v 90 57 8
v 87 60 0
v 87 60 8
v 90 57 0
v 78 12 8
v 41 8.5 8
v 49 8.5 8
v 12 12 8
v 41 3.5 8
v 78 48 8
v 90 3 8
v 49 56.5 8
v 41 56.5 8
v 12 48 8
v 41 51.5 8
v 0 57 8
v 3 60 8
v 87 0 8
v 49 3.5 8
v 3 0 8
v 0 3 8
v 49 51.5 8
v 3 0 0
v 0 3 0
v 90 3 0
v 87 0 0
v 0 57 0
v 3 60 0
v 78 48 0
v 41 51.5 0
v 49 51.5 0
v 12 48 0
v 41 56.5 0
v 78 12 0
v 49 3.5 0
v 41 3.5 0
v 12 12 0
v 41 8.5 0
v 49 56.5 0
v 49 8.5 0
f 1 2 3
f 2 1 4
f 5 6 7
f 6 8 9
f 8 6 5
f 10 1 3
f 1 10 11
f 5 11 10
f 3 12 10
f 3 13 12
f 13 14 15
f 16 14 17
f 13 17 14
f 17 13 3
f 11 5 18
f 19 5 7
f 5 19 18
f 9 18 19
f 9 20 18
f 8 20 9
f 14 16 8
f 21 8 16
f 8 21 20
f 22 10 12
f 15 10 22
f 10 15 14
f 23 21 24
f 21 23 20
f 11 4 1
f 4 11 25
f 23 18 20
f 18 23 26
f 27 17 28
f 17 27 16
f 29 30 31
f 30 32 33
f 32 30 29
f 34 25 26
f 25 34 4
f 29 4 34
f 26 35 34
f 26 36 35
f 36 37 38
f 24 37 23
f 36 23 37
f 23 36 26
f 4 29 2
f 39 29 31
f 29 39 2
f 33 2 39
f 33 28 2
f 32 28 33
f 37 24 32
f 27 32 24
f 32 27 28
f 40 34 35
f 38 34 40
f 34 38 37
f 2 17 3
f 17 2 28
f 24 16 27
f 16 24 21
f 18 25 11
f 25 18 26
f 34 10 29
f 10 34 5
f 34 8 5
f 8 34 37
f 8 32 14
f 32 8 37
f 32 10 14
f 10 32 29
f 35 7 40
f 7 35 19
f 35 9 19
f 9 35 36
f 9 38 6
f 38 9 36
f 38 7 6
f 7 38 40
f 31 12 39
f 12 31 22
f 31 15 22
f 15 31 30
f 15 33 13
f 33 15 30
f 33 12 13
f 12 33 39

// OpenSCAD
$fn = 32;

// ----------------------------------------------------------------------
// Frame plate: 90 x 60 frame, 12 mm rails
// ----------------------------------------------------------------------

// --- parameters (mm) ---
plate_l = 90;             // plate length, X
plate_w = 60;             // plate width, Y
plate_t = 8;              // plate thickness, Z (extrusion height)
corner_c = 3;             // corner chamfer
frame_bar = 12;           // frame rail width
slot_l = 8;               // adjustment slot length
slot_w = 5;               // adjustment slot width

win_l = plate_l - 2 * frame_bar;  // window length
win_w = plate_w - 2 * frame_bar;  // window width

profile = [[3, 0], [87, 0], [90, 3], [90, 57], [87, 60], [3, 60], [0, 57], [0, 3]];  // primary outline, 8 points, counter clockwise
void_1 = [[12, 12], [78, 12], [78, 48], [12, 48]];  // the window, 4 points
void_2 = [[41, 3.5], [49, 3.5], [49, 8.5], [41, 8.5]];  // adjustment slot, 4 points
void_3 = [[41, 51.5], [49, 51.5], [49, 56.5], [41, 56.5]];  // adjustment slot, 4 points

// --- the one profile operation ---
difference() {
  linear_extrude(height = plate_t) polygon(points = profile);
  translate([0, 0, -1])
    linear_extrude(height = plate_t + 2) polygon(points = void_1);
  translate([0, 0, -1])
    linear_extrude(height = plate_t + 2) polygon(points = void_2);
  translate([0, 0, -1])
    linear_extrude(height = plate_t + 2) polygon(points = void_3);
}
